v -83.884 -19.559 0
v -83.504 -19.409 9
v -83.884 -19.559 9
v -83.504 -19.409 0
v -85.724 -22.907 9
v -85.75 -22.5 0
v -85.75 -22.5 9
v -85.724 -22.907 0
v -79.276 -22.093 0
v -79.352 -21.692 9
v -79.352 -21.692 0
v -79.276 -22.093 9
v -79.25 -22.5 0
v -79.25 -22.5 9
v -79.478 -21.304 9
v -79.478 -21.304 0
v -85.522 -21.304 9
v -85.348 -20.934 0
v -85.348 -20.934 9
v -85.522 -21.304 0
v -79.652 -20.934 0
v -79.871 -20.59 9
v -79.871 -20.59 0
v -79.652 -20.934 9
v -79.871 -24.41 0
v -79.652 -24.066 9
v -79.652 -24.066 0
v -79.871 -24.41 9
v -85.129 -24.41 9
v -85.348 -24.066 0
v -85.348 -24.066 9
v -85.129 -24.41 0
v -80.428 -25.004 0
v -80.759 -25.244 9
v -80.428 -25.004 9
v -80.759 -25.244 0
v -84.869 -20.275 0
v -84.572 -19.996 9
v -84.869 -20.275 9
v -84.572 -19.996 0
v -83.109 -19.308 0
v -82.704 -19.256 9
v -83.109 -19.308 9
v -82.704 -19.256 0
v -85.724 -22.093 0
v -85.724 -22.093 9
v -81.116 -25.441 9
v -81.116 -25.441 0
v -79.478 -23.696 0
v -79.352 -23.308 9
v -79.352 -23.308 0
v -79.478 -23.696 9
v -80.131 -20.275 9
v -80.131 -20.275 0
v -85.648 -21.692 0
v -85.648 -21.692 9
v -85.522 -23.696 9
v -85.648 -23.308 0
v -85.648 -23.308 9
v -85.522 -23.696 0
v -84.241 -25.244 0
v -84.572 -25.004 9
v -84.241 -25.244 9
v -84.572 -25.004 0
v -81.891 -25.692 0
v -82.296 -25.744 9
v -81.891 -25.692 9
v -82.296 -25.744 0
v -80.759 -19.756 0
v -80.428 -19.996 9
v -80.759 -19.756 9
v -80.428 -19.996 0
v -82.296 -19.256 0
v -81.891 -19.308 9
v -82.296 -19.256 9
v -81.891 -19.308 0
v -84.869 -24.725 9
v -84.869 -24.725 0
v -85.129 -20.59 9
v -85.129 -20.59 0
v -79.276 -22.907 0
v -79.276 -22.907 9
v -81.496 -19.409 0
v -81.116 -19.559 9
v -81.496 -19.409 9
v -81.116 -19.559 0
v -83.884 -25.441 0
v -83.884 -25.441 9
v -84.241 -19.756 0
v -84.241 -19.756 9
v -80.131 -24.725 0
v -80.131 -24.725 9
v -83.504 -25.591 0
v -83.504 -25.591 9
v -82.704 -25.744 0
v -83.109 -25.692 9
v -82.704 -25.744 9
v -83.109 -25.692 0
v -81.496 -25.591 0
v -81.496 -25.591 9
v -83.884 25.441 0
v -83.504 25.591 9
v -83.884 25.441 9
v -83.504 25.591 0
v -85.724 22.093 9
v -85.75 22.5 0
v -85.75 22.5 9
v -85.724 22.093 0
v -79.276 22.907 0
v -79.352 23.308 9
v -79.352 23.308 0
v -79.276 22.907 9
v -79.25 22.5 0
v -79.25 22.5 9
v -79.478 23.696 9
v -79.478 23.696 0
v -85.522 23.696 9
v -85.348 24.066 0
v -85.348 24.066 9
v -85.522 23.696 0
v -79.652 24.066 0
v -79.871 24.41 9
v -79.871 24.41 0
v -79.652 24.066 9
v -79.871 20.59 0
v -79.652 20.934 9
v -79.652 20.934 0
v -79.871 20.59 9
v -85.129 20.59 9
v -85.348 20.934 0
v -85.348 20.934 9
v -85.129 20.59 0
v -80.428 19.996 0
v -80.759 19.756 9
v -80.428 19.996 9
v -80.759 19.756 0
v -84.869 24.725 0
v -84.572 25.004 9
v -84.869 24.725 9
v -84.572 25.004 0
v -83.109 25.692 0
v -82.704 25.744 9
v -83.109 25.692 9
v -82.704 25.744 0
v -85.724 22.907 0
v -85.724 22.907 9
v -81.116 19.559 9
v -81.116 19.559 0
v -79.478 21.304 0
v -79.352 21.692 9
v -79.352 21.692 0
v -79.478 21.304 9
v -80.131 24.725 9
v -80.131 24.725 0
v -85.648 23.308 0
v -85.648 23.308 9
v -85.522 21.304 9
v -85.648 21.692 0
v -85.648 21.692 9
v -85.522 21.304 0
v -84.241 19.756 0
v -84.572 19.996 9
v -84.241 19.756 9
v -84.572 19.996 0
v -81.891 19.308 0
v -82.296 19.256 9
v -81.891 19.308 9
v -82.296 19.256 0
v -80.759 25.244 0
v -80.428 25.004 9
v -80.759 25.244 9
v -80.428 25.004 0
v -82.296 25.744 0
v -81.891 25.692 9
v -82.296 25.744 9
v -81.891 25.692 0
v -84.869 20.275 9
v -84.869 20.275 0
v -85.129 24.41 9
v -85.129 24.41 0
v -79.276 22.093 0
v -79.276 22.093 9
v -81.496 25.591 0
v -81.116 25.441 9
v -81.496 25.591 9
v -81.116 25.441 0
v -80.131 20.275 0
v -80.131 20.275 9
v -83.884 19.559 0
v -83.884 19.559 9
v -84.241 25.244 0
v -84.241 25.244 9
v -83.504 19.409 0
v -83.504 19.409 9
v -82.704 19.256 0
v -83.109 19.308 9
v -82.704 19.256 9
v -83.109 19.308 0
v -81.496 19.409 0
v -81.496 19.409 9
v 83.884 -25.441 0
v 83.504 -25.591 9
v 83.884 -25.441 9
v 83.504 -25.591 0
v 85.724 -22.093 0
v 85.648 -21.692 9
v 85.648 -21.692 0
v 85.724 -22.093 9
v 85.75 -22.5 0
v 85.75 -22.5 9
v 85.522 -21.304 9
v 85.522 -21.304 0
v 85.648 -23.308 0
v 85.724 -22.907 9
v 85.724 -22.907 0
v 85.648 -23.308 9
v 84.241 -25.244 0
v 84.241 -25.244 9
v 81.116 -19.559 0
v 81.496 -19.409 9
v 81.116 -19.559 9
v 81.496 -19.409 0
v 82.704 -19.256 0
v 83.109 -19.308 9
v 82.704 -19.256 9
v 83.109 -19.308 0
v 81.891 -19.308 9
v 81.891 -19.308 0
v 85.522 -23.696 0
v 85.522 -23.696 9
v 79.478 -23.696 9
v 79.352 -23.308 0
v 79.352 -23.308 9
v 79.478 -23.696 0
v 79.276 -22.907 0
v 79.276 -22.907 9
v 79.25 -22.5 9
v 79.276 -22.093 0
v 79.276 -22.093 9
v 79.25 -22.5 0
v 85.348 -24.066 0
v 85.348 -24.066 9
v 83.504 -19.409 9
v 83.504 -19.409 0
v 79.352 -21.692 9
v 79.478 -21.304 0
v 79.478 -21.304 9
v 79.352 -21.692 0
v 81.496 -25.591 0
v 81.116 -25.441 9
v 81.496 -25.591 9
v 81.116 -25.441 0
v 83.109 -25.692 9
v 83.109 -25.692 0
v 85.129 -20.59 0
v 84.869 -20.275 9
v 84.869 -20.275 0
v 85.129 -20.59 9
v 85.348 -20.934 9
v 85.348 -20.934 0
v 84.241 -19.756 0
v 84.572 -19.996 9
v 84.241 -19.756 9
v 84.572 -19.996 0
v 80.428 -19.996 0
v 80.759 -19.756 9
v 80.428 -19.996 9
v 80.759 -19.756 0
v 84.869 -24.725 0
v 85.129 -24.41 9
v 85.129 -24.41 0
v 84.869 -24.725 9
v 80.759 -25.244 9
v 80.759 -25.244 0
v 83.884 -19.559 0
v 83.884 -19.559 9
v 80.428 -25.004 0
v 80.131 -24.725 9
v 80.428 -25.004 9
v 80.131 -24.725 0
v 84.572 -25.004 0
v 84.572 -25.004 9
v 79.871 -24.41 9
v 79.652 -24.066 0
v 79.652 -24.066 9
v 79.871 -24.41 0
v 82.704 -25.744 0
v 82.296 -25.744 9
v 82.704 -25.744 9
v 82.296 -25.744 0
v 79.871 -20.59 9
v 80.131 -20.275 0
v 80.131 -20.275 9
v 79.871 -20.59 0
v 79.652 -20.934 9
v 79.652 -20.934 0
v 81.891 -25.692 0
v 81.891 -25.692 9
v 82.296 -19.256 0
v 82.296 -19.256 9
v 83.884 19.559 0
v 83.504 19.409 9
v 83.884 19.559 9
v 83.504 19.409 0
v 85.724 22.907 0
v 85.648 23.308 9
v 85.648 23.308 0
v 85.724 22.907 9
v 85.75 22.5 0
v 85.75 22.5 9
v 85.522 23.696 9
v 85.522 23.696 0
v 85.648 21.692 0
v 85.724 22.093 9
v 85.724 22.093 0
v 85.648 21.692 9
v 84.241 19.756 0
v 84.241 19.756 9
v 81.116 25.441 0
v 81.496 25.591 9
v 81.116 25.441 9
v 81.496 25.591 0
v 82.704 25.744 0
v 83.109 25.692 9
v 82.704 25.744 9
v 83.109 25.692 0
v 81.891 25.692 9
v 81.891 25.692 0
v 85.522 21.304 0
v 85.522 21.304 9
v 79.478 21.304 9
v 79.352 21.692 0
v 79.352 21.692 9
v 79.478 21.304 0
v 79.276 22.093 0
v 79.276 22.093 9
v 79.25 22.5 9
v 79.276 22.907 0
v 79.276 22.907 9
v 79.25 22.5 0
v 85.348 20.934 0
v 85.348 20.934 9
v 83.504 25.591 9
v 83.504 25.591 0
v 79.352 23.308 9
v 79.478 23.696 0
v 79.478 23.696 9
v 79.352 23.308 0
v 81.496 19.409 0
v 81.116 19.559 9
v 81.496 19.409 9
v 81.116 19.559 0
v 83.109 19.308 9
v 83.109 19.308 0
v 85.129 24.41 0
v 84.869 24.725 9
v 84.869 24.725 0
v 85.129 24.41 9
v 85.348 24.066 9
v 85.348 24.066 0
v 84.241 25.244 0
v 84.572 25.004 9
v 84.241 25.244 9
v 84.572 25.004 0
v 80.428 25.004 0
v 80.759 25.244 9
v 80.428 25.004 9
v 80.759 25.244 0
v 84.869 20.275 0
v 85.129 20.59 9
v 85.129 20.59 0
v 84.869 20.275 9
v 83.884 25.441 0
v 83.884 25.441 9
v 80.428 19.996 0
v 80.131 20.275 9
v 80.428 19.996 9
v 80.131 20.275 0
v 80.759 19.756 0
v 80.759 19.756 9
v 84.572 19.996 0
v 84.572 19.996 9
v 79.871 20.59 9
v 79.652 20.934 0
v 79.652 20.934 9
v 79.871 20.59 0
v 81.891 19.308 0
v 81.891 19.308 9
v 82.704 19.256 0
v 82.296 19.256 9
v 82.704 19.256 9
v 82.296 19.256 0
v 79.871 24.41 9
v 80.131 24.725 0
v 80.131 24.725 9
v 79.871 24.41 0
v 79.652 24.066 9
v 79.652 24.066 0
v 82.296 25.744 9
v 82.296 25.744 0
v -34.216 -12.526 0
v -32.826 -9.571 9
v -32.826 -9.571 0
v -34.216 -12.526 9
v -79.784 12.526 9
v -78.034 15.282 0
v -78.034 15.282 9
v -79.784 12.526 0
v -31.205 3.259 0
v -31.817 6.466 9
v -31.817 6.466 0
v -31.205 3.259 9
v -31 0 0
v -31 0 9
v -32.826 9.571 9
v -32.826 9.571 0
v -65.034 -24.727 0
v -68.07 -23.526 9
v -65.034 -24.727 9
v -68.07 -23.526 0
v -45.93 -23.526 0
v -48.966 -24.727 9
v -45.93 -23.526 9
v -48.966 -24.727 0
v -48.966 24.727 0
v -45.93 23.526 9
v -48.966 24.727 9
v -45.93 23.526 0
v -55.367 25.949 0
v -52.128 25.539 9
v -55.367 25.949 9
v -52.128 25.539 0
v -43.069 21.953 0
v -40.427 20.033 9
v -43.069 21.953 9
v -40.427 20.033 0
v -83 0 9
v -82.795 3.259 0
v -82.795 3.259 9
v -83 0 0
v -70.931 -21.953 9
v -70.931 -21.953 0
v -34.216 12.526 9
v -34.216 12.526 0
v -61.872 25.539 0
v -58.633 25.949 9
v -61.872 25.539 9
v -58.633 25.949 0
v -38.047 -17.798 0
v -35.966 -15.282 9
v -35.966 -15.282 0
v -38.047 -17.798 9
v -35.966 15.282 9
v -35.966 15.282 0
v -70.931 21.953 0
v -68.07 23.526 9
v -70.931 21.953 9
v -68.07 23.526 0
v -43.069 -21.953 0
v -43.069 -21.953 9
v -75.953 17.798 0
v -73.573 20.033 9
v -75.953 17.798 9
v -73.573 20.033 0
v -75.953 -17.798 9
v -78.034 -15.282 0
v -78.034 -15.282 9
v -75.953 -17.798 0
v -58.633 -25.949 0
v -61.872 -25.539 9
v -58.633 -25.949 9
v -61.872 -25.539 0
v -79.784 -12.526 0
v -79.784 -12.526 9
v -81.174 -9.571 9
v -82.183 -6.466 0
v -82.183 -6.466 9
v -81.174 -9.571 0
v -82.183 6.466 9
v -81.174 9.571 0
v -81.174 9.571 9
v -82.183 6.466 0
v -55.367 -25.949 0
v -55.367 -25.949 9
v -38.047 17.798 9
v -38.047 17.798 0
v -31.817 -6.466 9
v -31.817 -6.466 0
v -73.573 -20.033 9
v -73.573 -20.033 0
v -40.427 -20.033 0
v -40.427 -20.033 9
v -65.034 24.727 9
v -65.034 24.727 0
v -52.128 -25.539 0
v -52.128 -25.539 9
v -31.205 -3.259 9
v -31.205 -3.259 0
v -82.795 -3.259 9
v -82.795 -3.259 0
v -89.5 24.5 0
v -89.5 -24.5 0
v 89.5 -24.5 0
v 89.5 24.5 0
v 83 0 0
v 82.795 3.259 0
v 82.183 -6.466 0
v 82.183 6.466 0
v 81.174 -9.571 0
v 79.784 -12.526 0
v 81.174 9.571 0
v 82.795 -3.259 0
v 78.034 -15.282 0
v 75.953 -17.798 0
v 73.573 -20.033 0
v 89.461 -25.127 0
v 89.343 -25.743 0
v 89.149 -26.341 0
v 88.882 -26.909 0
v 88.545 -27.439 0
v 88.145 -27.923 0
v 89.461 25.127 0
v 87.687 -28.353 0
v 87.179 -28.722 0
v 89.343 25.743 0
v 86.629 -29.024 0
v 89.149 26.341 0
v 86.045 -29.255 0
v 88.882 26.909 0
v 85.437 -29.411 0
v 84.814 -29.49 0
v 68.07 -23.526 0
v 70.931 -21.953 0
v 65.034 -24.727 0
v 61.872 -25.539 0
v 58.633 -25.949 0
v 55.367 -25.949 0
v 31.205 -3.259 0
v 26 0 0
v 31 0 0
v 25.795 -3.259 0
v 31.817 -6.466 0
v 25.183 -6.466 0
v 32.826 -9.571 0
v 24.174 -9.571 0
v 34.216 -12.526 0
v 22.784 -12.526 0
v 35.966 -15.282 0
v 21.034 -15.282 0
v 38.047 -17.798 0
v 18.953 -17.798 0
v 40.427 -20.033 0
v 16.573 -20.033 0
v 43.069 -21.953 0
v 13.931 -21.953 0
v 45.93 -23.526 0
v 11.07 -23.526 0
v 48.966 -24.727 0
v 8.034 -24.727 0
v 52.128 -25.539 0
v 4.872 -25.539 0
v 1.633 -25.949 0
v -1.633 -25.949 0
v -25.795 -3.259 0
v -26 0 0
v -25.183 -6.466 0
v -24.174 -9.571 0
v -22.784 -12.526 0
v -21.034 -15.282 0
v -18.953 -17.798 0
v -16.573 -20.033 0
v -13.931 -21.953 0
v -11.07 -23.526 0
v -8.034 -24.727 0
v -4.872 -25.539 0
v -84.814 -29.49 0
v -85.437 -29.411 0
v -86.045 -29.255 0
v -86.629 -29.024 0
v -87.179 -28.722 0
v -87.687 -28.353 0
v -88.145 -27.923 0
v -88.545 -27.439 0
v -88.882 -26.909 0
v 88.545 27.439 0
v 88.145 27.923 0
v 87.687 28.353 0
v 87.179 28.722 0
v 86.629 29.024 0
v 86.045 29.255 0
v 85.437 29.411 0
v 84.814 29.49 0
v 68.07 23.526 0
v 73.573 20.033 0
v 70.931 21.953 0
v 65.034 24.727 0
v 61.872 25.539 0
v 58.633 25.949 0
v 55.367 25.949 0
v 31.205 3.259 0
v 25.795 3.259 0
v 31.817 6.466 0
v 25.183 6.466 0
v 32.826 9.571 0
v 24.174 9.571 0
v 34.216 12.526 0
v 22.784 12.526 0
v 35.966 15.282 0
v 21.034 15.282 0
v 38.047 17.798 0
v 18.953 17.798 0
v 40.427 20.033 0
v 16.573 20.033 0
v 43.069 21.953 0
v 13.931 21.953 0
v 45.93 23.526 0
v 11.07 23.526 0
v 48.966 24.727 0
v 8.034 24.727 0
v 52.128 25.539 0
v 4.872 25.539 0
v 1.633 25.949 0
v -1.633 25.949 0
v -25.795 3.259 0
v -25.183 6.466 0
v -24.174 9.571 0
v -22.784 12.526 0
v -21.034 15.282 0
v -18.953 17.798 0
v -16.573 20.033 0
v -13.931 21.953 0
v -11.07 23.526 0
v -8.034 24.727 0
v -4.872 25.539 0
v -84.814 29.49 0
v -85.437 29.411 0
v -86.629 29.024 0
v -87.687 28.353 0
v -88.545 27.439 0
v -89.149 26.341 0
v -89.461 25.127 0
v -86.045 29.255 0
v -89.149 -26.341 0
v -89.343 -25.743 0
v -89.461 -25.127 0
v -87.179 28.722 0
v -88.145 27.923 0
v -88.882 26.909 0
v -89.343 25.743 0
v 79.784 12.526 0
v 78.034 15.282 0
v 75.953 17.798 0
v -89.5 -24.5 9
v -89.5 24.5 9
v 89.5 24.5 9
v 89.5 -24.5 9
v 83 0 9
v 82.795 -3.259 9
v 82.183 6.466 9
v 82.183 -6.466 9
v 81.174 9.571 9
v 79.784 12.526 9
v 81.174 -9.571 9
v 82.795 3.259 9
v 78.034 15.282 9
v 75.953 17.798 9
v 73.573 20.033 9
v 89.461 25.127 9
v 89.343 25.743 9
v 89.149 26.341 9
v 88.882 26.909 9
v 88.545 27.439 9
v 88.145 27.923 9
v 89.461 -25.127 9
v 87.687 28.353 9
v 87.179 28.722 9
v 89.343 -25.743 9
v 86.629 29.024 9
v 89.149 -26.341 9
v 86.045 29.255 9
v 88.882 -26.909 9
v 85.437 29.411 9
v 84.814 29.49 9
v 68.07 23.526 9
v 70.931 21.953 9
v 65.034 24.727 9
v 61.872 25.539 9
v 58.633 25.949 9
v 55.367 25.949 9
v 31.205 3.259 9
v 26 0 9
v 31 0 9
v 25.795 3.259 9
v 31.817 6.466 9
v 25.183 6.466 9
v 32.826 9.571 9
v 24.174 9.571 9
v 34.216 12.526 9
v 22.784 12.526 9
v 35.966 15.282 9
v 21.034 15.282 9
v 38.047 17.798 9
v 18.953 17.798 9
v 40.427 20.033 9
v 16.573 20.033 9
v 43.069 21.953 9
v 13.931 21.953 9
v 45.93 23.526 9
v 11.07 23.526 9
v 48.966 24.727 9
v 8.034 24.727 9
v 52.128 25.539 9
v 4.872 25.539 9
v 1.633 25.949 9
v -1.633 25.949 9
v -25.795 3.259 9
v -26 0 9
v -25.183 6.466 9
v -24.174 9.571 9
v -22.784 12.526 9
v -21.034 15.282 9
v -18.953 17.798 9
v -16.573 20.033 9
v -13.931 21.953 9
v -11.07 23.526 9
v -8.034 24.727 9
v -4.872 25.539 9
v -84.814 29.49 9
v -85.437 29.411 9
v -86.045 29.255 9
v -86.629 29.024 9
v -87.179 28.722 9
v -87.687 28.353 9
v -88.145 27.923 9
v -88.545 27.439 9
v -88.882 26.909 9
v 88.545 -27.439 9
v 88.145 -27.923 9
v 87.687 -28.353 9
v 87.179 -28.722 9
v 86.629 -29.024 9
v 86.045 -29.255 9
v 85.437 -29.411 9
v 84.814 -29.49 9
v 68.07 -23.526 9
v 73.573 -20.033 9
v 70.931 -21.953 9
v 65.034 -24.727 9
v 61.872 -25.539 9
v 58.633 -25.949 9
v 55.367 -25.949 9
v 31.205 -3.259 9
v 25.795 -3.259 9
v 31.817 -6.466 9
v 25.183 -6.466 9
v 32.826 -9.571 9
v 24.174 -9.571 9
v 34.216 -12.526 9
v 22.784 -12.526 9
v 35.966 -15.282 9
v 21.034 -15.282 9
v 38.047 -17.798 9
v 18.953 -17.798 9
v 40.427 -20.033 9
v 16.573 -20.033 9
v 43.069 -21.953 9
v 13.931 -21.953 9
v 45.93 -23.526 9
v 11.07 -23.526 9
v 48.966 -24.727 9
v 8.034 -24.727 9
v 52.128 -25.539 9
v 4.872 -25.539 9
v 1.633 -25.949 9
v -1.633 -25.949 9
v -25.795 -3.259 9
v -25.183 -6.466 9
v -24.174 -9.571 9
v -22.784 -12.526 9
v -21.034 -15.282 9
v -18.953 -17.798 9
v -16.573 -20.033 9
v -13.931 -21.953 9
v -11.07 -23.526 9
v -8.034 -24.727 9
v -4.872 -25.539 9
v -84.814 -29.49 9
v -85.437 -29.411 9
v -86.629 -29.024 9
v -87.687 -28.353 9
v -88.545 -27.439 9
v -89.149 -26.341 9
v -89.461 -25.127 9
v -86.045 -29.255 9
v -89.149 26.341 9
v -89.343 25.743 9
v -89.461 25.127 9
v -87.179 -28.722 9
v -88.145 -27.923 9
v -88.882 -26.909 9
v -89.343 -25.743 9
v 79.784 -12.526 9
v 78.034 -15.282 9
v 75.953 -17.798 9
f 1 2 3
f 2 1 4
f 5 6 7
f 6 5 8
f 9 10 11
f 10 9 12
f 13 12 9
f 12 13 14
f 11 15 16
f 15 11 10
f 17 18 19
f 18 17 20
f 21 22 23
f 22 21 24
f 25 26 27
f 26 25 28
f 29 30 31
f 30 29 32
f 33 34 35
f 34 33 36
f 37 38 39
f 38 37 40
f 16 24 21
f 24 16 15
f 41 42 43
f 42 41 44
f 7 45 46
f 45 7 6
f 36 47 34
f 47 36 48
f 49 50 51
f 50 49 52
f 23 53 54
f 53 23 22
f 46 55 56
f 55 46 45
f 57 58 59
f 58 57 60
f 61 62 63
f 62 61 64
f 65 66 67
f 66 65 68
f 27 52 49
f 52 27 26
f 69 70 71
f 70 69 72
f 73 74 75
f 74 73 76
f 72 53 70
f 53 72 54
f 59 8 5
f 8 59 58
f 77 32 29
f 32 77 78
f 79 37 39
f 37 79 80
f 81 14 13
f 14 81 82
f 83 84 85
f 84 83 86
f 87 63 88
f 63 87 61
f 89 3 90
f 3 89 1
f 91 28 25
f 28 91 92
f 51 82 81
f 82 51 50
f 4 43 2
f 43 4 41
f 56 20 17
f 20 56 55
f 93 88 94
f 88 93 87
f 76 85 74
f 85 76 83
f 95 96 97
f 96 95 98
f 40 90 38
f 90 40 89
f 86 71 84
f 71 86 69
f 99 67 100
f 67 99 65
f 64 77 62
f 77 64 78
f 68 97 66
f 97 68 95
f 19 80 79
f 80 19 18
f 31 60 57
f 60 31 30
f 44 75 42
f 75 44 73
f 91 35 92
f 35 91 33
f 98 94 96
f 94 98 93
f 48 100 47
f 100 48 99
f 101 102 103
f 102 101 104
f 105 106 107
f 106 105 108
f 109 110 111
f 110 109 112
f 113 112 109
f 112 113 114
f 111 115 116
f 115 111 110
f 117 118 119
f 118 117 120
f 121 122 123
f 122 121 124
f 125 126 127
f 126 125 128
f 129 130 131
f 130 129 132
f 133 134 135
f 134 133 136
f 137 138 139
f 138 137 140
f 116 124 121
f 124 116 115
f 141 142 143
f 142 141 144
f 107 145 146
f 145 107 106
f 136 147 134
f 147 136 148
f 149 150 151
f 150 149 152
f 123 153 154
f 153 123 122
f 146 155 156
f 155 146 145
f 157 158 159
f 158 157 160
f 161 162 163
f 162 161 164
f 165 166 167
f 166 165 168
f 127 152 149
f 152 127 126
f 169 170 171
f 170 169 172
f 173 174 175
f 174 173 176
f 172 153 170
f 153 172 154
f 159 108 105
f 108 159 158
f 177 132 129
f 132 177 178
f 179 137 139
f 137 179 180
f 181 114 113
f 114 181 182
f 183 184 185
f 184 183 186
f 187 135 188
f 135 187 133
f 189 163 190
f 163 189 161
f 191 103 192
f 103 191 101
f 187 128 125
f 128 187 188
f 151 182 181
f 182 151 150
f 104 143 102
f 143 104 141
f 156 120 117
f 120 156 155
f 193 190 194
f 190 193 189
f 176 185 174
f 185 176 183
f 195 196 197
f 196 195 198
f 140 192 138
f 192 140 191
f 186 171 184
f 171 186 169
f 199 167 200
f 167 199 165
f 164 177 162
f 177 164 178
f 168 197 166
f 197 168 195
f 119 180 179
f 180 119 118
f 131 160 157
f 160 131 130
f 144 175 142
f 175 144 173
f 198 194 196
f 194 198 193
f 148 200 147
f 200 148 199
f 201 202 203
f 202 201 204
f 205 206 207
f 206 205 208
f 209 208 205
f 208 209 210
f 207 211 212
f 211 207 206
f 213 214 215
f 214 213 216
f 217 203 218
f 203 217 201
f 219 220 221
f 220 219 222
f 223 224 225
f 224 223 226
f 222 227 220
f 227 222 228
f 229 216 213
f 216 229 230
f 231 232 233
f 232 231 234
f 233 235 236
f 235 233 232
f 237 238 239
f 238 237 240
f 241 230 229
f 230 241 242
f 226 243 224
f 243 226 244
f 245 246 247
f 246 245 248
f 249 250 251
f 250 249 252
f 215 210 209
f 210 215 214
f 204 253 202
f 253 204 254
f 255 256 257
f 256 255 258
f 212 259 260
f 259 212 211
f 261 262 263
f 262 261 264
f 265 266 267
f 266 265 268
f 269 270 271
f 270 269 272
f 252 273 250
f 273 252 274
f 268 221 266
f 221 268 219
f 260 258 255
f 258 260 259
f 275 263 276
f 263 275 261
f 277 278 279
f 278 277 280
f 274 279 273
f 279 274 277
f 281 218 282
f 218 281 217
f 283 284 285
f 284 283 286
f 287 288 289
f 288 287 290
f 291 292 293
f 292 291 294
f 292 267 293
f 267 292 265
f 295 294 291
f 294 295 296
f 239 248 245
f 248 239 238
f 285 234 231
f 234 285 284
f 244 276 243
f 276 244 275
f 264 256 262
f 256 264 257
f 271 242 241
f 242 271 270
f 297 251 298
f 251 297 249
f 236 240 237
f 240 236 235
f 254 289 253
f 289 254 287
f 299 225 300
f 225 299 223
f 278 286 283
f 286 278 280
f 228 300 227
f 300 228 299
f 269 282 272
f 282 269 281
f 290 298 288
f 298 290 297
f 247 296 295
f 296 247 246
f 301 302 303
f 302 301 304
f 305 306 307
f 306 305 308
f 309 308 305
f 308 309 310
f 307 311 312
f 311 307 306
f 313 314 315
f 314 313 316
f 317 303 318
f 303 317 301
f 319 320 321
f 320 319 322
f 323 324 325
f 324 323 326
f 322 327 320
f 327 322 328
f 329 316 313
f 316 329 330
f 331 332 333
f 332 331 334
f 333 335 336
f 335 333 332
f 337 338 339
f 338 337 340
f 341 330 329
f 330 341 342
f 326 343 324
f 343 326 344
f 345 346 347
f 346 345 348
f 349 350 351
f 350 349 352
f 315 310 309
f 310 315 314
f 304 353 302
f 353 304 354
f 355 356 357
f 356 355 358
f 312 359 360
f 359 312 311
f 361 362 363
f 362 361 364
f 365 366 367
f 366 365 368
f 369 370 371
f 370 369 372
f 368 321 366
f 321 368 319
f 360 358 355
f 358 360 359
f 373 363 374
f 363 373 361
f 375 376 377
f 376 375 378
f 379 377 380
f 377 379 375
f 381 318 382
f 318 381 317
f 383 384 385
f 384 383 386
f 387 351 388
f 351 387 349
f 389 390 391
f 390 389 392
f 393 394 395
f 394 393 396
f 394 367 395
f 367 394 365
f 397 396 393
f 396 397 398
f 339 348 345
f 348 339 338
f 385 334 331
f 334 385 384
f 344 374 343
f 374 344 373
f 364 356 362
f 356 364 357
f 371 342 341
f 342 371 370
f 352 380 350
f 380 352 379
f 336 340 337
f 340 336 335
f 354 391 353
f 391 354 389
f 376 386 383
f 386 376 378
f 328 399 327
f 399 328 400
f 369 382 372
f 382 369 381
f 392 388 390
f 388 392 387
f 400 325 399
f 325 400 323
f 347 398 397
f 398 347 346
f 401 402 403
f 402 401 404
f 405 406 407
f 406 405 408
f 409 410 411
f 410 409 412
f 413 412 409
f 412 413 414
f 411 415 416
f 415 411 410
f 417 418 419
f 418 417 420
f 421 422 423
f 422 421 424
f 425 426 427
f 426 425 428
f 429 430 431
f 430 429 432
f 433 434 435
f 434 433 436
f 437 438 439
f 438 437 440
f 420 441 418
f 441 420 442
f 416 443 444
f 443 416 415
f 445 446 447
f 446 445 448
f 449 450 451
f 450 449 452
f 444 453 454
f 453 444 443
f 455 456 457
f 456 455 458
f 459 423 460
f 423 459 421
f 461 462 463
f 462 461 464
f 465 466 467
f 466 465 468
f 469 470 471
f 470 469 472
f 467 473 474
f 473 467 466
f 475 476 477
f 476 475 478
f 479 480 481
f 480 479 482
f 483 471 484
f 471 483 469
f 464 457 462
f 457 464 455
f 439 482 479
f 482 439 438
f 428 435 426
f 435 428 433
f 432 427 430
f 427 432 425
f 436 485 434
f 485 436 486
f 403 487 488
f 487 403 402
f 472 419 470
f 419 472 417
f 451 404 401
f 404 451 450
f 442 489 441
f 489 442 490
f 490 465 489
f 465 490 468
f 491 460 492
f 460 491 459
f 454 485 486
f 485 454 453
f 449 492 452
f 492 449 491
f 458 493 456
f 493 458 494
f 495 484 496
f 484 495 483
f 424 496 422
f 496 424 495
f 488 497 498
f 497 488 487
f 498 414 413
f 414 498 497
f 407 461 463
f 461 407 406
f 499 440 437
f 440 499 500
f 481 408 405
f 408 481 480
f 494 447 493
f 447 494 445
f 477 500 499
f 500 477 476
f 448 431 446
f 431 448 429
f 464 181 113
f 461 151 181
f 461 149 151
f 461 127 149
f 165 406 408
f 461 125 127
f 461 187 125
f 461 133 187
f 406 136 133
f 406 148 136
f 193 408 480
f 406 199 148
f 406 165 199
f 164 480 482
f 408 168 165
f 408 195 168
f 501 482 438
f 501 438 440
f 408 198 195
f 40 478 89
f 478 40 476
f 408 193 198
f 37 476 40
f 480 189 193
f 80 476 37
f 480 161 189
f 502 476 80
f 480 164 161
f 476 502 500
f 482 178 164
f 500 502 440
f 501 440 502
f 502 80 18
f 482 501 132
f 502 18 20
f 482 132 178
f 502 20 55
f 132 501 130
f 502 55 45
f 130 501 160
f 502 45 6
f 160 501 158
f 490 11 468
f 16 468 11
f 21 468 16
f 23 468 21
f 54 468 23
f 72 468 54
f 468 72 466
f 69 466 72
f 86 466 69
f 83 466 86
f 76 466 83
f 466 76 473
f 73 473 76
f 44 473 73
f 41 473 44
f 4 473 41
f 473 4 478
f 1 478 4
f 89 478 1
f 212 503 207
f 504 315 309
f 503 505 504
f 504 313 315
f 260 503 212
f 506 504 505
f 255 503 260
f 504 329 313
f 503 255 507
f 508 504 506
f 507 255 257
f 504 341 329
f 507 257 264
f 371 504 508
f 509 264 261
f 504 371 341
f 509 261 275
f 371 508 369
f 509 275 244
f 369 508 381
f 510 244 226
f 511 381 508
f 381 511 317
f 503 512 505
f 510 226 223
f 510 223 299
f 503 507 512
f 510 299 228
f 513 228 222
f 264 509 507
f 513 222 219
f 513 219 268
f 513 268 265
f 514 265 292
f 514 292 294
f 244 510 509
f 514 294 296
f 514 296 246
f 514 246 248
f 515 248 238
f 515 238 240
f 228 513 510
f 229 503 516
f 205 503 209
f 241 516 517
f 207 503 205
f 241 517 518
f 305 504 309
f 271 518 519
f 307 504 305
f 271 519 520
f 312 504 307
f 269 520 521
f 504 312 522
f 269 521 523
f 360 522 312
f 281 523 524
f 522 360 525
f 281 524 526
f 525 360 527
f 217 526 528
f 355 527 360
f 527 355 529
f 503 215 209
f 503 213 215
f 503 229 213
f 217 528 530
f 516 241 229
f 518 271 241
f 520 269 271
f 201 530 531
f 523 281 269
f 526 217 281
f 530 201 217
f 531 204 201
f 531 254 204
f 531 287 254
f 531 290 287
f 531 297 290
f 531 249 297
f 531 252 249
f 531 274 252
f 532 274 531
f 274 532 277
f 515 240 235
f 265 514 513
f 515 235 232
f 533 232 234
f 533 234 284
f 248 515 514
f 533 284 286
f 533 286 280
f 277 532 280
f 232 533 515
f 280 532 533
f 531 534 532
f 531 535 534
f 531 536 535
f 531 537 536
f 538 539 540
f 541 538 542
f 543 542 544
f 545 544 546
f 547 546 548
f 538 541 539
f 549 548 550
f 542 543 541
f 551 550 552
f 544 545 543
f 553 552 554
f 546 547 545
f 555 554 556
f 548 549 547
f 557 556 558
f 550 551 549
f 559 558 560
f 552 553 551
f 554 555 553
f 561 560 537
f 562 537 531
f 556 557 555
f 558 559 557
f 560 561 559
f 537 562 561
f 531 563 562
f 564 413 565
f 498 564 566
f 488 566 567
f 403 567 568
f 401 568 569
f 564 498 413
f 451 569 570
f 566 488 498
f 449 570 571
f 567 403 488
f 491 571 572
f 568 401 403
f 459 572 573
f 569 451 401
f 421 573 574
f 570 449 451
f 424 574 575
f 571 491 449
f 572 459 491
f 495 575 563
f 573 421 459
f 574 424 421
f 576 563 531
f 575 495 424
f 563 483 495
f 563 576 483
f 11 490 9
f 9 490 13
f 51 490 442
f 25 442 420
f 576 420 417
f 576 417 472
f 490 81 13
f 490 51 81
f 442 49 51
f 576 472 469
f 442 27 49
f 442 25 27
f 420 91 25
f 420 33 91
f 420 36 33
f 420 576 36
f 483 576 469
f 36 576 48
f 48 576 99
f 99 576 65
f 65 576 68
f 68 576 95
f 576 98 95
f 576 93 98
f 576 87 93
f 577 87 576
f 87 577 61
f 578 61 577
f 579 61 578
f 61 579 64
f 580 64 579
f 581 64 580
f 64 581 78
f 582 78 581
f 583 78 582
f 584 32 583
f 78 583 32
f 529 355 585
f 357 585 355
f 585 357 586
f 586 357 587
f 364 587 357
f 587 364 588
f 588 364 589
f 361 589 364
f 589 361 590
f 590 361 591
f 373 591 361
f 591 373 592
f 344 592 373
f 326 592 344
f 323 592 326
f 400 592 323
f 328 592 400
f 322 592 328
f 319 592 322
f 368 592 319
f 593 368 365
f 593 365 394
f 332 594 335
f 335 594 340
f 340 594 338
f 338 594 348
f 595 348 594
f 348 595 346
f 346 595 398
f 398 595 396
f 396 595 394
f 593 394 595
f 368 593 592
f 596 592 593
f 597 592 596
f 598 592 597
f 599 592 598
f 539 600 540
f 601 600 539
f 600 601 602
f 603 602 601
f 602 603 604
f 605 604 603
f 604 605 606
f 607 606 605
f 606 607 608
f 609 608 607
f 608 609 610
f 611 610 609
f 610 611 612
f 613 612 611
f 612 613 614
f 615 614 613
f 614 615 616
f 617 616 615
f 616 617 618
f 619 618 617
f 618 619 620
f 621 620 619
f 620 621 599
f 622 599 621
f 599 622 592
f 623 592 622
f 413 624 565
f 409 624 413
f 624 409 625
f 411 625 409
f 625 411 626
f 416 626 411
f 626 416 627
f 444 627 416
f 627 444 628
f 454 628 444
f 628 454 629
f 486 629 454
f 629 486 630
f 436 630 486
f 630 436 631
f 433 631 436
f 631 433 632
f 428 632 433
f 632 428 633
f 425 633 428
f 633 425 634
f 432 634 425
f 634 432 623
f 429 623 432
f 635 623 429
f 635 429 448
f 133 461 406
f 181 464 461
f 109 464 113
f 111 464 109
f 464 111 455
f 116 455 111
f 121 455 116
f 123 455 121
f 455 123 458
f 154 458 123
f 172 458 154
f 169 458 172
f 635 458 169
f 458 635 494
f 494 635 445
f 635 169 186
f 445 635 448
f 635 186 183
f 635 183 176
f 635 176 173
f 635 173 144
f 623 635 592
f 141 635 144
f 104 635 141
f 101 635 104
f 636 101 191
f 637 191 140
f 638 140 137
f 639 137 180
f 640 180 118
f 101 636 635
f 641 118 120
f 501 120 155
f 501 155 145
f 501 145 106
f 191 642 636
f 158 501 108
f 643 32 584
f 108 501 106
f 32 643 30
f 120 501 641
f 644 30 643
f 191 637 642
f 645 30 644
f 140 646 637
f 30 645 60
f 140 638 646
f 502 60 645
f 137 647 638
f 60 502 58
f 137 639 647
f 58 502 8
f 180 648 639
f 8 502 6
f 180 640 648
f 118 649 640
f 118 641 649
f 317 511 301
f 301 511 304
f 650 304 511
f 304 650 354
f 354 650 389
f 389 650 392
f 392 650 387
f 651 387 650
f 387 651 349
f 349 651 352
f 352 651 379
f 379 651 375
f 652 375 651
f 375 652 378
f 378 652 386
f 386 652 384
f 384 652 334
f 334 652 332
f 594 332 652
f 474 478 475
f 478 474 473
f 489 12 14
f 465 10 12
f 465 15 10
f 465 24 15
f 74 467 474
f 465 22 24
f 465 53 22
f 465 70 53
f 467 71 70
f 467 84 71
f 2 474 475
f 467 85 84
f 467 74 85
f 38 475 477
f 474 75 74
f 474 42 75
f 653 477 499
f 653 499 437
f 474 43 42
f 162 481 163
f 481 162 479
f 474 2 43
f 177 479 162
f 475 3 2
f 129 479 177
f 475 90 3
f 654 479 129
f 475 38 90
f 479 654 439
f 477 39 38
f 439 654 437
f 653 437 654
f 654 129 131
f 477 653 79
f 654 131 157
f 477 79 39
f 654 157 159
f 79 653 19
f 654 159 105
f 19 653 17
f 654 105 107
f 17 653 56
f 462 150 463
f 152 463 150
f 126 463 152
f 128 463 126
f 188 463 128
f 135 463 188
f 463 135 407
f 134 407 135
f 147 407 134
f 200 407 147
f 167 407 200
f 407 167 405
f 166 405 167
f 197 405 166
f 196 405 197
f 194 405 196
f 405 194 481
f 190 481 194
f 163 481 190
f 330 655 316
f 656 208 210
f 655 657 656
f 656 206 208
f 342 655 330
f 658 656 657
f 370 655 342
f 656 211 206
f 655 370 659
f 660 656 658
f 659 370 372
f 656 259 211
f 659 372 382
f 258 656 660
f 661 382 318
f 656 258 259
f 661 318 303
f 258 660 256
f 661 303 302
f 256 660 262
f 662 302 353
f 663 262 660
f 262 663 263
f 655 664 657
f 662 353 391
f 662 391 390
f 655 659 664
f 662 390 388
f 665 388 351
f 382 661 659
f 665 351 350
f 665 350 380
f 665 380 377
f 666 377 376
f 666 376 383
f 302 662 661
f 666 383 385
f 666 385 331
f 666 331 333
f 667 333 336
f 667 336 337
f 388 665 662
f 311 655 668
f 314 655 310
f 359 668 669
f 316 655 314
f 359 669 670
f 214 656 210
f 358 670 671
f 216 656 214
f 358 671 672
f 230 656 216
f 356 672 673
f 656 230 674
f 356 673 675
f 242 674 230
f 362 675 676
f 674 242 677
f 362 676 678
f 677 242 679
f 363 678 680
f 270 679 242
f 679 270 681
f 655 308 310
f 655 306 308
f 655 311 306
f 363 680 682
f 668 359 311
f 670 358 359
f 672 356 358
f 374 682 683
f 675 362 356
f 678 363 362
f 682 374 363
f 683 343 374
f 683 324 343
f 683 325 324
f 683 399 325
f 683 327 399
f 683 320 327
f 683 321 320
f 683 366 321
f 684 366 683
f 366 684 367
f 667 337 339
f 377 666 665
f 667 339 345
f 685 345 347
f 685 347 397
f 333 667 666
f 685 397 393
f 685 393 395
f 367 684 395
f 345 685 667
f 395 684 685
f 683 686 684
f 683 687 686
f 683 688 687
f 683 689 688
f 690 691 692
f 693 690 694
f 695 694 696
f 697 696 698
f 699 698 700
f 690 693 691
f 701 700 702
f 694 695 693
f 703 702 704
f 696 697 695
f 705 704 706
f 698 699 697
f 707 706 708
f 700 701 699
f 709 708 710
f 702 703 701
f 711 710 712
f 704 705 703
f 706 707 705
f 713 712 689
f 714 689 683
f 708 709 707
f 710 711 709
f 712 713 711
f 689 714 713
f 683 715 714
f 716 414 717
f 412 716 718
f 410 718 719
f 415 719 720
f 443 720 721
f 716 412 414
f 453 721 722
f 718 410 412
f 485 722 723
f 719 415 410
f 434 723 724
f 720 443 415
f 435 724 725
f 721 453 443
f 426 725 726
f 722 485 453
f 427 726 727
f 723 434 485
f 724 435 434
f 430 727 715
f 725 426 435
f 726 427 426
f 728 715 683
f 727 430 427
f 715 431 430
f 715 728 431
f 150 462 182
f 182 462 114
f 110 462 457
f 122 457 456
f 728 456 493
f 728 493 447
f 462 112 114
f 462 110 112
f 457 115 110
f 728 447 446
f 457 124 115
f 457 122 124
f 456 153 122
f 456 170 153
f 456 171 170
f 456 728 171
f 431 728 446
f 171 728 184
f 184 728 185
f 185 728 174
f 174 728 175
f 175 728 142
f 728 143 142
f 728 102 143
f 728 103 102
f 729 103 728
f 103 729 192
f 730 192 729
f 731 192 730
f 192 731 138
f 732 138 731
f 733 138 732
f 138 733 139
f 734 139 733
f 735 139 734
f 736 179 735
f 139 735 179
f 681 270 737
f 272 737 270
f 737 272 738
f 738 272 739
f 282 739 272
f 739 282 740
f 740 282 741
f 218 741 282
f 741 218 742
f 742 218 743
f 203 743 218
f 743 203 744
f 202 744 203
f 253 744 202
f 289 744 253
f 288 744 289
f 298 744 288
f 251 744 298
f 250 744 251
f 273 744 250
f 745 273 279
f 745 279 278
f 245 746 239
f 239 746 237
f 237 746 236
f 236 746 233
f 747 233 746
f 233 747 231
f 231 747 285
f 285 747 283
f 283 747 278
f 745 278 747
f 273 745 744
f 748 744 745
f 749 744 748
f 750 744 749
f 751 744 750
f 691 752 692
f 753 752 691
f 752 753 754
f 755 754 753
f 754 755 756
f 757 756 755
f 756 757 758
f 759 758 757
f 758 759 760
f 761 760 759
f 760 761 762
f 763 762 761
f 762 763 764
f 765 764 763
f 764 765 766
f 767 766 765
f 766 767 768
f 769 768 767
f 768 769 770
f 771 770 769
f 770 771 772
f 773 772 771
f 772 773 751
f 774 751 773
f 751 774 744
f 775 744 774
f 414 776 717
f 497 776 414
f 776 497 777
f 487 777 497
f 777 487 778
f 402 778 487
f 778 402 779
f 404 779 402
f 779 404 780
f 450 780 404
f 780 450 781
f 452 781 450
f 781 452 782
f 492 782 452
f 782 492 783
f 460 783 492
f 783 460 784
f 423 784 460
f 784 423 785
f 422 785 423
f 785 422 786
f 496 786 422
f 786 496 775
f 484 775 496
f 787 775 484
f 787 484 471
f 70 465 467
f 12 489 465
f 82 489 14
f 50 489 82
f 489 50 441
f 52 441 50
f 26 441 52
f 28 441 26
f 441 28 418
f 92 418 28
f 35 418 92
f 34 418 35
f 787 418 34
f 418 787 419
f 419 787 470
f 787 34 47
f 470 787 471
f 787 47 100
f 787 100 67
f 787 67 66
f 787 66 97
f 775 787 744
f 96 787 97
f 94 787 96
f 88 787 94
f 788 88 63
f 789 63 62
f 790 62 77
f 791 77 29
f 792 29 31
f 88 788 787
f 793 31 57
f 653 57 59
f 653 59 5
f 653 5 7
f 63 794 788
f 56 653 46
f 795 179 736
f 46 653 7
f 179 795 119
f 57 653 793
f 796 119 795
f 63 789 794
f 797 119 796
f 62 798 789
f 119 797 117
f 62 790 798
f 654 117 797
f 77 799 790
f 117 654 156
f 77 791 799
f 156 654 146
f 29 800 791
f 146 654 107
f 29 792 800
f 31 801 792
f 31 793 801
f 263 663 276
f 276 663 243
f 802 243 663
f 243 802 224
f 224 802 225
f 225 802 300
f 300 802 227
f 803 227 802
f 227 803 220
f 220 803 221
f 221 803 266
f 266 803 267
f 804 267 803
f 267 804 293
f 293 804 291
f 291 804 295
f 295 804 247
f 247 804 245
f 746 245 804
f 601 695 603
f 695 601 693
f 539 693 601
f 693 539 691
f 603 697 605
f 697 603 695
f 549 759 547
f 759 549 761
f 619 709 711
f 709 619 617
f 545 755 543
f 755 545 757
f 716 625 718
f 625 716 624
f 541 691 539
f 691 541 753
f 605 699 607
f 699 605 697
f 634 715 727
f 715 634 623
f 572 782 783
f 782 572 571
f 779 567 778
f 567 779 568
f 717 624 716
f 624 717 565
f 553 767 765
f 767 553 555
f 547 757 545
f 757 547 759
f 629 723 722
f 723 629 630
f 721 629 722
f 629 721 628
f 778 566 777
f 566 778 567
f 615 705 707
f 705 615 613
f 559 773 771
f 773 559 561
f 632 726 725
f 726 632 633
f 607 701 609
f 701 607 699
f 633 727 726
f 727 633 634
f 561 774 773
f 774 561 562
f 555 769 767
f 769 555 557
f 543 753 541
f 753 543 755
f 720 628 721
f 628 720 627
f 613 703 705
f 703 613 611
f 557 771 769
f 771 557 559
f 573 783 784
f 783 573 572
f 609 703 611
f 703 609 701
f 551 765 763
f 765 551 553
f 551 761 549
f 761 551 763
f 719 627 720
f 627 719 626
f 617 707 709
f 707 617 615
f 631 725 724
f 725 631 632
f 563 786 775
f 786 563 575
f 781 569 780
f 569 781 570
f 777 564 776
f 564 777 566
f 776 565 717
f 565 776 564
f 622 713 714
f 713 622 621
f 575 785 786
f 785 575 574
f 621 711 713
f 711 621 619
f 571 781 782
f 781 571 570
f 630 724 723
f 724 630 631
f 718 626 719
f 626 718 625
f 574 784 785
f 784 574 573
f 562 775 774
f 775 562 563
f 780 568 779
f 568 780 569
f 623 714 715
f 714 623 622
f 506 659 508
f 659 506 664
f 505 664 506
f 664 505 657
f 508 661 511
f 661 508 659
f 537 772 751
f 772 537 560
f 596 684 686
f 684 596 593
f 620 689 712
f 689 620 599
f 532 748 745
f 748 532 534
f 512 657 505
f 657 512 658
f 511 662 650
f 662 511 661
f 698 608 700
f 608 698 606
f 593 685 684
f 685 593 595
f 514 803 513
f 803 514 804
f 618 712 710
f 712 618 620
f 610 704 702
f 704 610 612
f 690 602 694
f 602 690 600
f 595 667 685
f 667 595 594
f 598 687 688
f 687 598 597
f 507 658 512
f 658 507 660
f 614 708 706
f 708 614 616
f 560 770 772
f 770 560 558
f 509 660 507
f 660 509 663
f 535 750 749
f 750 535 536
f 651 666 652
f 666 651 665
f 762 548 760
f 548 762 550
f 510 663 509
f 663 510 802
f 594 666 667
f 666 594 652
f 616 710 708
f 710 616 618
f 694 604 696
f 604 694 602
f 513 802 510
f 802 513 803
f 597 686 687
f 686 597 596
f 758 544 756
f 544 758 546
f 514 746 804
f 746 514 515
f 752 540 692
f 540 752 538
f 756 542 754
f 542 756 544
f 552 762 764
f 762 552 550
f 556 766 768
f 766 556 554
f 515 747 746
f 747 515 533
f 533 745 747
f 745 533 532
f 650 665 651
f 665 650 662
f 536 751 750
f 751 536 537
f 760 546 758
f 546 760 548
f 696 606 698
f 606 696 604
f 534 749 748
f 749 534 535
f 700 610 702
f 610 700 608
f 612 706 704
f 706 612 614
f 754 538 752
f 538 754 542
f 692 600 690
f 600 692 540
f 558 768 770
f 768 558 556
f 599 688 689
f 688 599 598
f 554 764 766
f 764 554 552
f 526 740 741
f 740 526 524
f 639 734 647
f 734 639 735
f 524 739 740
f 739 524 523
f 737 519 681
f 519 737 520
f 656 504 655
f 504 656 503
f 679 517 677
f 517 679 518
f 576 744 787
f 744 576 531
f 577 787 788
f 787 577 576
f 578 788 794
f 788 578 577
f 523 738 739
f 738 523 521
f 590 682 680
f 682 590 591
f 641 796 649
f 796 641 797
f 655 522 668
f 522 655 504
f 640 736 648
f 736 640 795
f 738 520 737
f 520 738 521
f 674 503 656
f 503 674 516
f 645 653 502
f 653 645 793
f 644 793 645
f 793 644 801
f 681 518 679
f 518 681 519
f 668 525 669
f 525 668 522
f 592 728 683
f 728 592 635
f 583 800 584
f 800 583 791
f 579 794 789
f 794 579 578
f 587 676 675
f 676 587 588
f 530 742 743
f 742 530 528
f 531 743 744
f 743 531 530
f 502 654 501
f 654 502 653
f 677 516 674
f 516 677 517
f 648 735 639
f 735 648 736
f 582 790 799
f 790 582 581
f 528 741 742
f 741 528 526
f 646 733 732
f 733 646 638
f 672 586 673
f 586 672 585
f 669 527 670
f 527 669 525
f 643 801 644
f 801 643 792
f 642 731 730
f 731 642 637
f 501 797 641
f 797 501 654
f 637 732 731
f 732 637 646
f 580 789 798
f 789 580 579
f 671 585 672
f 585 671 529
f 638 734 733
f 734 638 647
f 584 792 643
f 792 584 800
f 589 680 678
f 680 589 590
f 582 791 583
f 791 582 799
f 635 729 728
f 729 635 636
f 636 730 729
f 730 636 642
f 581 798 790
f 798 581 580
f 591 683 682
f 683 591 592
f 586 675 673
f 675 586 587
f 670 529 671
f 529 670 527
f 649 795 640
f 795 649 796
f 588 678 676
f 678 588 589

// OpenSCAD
$fn = 50;

difference() {
	union() {
		hull() {
			translate(v = [-84.5, 24.5, 0]) {
				cylinder(h = 9, r = 5);
			}
			translate(v = [84.5, 24.5, 0]) {
				cylinder(h = 9, r = 5);
			}
			translate(v = [-84.5, -24.5, 0]) {
				cylinder(h = 9, r = 5);
			}
			translate(v = [84.5, -24.5, 0]) {
				cylinder(h = 9, r = 5);
			}
		}
	}
	union() {
		translate(v = [-82.5, -22.5, -100.0]) {
			cylinder(h = 200, r = 3.25);
		}
		translate(v = [-82.5, 22.5, -100.0]) {
			cylinder(h = 200, r = 3.25);
		}
		translate(v = [82.5, -22.5, -100.0]) {
			cylinder(h = 200, r = 3.25);
		}
		translate(v = [82.5, 22.5, -100.0]) {
			cylinder(h = 200, r = 3.25);
		}
		translate(v = [-82.5, -22.5, -100.0]) {
			cylinder(h = 200, r = 1.8);
		}
		translate(v = [-82.5, 22.5, -100.0]) {
			cylinder(h = 200, r = 1.8);
		}
		translate(v = [82.5, -22.5, -100.0]) {
			cylinder(h = 200, r = 1.8);
		}
		translate(v = [82.5, 22.5, -100.0]) {
			cylinder(h = 200, r = 1.8);
		}
		translate(v = [-57.0, 0, 0.0]) {
			cylinder(h = 9, r = 26.0);
		}
		cylinder(h = 9, r = 26.0);
		translate(v = [57.0, 0, 0.0]) {
			cylinder(h = 9, r = 26.0);
		}
	}
}
